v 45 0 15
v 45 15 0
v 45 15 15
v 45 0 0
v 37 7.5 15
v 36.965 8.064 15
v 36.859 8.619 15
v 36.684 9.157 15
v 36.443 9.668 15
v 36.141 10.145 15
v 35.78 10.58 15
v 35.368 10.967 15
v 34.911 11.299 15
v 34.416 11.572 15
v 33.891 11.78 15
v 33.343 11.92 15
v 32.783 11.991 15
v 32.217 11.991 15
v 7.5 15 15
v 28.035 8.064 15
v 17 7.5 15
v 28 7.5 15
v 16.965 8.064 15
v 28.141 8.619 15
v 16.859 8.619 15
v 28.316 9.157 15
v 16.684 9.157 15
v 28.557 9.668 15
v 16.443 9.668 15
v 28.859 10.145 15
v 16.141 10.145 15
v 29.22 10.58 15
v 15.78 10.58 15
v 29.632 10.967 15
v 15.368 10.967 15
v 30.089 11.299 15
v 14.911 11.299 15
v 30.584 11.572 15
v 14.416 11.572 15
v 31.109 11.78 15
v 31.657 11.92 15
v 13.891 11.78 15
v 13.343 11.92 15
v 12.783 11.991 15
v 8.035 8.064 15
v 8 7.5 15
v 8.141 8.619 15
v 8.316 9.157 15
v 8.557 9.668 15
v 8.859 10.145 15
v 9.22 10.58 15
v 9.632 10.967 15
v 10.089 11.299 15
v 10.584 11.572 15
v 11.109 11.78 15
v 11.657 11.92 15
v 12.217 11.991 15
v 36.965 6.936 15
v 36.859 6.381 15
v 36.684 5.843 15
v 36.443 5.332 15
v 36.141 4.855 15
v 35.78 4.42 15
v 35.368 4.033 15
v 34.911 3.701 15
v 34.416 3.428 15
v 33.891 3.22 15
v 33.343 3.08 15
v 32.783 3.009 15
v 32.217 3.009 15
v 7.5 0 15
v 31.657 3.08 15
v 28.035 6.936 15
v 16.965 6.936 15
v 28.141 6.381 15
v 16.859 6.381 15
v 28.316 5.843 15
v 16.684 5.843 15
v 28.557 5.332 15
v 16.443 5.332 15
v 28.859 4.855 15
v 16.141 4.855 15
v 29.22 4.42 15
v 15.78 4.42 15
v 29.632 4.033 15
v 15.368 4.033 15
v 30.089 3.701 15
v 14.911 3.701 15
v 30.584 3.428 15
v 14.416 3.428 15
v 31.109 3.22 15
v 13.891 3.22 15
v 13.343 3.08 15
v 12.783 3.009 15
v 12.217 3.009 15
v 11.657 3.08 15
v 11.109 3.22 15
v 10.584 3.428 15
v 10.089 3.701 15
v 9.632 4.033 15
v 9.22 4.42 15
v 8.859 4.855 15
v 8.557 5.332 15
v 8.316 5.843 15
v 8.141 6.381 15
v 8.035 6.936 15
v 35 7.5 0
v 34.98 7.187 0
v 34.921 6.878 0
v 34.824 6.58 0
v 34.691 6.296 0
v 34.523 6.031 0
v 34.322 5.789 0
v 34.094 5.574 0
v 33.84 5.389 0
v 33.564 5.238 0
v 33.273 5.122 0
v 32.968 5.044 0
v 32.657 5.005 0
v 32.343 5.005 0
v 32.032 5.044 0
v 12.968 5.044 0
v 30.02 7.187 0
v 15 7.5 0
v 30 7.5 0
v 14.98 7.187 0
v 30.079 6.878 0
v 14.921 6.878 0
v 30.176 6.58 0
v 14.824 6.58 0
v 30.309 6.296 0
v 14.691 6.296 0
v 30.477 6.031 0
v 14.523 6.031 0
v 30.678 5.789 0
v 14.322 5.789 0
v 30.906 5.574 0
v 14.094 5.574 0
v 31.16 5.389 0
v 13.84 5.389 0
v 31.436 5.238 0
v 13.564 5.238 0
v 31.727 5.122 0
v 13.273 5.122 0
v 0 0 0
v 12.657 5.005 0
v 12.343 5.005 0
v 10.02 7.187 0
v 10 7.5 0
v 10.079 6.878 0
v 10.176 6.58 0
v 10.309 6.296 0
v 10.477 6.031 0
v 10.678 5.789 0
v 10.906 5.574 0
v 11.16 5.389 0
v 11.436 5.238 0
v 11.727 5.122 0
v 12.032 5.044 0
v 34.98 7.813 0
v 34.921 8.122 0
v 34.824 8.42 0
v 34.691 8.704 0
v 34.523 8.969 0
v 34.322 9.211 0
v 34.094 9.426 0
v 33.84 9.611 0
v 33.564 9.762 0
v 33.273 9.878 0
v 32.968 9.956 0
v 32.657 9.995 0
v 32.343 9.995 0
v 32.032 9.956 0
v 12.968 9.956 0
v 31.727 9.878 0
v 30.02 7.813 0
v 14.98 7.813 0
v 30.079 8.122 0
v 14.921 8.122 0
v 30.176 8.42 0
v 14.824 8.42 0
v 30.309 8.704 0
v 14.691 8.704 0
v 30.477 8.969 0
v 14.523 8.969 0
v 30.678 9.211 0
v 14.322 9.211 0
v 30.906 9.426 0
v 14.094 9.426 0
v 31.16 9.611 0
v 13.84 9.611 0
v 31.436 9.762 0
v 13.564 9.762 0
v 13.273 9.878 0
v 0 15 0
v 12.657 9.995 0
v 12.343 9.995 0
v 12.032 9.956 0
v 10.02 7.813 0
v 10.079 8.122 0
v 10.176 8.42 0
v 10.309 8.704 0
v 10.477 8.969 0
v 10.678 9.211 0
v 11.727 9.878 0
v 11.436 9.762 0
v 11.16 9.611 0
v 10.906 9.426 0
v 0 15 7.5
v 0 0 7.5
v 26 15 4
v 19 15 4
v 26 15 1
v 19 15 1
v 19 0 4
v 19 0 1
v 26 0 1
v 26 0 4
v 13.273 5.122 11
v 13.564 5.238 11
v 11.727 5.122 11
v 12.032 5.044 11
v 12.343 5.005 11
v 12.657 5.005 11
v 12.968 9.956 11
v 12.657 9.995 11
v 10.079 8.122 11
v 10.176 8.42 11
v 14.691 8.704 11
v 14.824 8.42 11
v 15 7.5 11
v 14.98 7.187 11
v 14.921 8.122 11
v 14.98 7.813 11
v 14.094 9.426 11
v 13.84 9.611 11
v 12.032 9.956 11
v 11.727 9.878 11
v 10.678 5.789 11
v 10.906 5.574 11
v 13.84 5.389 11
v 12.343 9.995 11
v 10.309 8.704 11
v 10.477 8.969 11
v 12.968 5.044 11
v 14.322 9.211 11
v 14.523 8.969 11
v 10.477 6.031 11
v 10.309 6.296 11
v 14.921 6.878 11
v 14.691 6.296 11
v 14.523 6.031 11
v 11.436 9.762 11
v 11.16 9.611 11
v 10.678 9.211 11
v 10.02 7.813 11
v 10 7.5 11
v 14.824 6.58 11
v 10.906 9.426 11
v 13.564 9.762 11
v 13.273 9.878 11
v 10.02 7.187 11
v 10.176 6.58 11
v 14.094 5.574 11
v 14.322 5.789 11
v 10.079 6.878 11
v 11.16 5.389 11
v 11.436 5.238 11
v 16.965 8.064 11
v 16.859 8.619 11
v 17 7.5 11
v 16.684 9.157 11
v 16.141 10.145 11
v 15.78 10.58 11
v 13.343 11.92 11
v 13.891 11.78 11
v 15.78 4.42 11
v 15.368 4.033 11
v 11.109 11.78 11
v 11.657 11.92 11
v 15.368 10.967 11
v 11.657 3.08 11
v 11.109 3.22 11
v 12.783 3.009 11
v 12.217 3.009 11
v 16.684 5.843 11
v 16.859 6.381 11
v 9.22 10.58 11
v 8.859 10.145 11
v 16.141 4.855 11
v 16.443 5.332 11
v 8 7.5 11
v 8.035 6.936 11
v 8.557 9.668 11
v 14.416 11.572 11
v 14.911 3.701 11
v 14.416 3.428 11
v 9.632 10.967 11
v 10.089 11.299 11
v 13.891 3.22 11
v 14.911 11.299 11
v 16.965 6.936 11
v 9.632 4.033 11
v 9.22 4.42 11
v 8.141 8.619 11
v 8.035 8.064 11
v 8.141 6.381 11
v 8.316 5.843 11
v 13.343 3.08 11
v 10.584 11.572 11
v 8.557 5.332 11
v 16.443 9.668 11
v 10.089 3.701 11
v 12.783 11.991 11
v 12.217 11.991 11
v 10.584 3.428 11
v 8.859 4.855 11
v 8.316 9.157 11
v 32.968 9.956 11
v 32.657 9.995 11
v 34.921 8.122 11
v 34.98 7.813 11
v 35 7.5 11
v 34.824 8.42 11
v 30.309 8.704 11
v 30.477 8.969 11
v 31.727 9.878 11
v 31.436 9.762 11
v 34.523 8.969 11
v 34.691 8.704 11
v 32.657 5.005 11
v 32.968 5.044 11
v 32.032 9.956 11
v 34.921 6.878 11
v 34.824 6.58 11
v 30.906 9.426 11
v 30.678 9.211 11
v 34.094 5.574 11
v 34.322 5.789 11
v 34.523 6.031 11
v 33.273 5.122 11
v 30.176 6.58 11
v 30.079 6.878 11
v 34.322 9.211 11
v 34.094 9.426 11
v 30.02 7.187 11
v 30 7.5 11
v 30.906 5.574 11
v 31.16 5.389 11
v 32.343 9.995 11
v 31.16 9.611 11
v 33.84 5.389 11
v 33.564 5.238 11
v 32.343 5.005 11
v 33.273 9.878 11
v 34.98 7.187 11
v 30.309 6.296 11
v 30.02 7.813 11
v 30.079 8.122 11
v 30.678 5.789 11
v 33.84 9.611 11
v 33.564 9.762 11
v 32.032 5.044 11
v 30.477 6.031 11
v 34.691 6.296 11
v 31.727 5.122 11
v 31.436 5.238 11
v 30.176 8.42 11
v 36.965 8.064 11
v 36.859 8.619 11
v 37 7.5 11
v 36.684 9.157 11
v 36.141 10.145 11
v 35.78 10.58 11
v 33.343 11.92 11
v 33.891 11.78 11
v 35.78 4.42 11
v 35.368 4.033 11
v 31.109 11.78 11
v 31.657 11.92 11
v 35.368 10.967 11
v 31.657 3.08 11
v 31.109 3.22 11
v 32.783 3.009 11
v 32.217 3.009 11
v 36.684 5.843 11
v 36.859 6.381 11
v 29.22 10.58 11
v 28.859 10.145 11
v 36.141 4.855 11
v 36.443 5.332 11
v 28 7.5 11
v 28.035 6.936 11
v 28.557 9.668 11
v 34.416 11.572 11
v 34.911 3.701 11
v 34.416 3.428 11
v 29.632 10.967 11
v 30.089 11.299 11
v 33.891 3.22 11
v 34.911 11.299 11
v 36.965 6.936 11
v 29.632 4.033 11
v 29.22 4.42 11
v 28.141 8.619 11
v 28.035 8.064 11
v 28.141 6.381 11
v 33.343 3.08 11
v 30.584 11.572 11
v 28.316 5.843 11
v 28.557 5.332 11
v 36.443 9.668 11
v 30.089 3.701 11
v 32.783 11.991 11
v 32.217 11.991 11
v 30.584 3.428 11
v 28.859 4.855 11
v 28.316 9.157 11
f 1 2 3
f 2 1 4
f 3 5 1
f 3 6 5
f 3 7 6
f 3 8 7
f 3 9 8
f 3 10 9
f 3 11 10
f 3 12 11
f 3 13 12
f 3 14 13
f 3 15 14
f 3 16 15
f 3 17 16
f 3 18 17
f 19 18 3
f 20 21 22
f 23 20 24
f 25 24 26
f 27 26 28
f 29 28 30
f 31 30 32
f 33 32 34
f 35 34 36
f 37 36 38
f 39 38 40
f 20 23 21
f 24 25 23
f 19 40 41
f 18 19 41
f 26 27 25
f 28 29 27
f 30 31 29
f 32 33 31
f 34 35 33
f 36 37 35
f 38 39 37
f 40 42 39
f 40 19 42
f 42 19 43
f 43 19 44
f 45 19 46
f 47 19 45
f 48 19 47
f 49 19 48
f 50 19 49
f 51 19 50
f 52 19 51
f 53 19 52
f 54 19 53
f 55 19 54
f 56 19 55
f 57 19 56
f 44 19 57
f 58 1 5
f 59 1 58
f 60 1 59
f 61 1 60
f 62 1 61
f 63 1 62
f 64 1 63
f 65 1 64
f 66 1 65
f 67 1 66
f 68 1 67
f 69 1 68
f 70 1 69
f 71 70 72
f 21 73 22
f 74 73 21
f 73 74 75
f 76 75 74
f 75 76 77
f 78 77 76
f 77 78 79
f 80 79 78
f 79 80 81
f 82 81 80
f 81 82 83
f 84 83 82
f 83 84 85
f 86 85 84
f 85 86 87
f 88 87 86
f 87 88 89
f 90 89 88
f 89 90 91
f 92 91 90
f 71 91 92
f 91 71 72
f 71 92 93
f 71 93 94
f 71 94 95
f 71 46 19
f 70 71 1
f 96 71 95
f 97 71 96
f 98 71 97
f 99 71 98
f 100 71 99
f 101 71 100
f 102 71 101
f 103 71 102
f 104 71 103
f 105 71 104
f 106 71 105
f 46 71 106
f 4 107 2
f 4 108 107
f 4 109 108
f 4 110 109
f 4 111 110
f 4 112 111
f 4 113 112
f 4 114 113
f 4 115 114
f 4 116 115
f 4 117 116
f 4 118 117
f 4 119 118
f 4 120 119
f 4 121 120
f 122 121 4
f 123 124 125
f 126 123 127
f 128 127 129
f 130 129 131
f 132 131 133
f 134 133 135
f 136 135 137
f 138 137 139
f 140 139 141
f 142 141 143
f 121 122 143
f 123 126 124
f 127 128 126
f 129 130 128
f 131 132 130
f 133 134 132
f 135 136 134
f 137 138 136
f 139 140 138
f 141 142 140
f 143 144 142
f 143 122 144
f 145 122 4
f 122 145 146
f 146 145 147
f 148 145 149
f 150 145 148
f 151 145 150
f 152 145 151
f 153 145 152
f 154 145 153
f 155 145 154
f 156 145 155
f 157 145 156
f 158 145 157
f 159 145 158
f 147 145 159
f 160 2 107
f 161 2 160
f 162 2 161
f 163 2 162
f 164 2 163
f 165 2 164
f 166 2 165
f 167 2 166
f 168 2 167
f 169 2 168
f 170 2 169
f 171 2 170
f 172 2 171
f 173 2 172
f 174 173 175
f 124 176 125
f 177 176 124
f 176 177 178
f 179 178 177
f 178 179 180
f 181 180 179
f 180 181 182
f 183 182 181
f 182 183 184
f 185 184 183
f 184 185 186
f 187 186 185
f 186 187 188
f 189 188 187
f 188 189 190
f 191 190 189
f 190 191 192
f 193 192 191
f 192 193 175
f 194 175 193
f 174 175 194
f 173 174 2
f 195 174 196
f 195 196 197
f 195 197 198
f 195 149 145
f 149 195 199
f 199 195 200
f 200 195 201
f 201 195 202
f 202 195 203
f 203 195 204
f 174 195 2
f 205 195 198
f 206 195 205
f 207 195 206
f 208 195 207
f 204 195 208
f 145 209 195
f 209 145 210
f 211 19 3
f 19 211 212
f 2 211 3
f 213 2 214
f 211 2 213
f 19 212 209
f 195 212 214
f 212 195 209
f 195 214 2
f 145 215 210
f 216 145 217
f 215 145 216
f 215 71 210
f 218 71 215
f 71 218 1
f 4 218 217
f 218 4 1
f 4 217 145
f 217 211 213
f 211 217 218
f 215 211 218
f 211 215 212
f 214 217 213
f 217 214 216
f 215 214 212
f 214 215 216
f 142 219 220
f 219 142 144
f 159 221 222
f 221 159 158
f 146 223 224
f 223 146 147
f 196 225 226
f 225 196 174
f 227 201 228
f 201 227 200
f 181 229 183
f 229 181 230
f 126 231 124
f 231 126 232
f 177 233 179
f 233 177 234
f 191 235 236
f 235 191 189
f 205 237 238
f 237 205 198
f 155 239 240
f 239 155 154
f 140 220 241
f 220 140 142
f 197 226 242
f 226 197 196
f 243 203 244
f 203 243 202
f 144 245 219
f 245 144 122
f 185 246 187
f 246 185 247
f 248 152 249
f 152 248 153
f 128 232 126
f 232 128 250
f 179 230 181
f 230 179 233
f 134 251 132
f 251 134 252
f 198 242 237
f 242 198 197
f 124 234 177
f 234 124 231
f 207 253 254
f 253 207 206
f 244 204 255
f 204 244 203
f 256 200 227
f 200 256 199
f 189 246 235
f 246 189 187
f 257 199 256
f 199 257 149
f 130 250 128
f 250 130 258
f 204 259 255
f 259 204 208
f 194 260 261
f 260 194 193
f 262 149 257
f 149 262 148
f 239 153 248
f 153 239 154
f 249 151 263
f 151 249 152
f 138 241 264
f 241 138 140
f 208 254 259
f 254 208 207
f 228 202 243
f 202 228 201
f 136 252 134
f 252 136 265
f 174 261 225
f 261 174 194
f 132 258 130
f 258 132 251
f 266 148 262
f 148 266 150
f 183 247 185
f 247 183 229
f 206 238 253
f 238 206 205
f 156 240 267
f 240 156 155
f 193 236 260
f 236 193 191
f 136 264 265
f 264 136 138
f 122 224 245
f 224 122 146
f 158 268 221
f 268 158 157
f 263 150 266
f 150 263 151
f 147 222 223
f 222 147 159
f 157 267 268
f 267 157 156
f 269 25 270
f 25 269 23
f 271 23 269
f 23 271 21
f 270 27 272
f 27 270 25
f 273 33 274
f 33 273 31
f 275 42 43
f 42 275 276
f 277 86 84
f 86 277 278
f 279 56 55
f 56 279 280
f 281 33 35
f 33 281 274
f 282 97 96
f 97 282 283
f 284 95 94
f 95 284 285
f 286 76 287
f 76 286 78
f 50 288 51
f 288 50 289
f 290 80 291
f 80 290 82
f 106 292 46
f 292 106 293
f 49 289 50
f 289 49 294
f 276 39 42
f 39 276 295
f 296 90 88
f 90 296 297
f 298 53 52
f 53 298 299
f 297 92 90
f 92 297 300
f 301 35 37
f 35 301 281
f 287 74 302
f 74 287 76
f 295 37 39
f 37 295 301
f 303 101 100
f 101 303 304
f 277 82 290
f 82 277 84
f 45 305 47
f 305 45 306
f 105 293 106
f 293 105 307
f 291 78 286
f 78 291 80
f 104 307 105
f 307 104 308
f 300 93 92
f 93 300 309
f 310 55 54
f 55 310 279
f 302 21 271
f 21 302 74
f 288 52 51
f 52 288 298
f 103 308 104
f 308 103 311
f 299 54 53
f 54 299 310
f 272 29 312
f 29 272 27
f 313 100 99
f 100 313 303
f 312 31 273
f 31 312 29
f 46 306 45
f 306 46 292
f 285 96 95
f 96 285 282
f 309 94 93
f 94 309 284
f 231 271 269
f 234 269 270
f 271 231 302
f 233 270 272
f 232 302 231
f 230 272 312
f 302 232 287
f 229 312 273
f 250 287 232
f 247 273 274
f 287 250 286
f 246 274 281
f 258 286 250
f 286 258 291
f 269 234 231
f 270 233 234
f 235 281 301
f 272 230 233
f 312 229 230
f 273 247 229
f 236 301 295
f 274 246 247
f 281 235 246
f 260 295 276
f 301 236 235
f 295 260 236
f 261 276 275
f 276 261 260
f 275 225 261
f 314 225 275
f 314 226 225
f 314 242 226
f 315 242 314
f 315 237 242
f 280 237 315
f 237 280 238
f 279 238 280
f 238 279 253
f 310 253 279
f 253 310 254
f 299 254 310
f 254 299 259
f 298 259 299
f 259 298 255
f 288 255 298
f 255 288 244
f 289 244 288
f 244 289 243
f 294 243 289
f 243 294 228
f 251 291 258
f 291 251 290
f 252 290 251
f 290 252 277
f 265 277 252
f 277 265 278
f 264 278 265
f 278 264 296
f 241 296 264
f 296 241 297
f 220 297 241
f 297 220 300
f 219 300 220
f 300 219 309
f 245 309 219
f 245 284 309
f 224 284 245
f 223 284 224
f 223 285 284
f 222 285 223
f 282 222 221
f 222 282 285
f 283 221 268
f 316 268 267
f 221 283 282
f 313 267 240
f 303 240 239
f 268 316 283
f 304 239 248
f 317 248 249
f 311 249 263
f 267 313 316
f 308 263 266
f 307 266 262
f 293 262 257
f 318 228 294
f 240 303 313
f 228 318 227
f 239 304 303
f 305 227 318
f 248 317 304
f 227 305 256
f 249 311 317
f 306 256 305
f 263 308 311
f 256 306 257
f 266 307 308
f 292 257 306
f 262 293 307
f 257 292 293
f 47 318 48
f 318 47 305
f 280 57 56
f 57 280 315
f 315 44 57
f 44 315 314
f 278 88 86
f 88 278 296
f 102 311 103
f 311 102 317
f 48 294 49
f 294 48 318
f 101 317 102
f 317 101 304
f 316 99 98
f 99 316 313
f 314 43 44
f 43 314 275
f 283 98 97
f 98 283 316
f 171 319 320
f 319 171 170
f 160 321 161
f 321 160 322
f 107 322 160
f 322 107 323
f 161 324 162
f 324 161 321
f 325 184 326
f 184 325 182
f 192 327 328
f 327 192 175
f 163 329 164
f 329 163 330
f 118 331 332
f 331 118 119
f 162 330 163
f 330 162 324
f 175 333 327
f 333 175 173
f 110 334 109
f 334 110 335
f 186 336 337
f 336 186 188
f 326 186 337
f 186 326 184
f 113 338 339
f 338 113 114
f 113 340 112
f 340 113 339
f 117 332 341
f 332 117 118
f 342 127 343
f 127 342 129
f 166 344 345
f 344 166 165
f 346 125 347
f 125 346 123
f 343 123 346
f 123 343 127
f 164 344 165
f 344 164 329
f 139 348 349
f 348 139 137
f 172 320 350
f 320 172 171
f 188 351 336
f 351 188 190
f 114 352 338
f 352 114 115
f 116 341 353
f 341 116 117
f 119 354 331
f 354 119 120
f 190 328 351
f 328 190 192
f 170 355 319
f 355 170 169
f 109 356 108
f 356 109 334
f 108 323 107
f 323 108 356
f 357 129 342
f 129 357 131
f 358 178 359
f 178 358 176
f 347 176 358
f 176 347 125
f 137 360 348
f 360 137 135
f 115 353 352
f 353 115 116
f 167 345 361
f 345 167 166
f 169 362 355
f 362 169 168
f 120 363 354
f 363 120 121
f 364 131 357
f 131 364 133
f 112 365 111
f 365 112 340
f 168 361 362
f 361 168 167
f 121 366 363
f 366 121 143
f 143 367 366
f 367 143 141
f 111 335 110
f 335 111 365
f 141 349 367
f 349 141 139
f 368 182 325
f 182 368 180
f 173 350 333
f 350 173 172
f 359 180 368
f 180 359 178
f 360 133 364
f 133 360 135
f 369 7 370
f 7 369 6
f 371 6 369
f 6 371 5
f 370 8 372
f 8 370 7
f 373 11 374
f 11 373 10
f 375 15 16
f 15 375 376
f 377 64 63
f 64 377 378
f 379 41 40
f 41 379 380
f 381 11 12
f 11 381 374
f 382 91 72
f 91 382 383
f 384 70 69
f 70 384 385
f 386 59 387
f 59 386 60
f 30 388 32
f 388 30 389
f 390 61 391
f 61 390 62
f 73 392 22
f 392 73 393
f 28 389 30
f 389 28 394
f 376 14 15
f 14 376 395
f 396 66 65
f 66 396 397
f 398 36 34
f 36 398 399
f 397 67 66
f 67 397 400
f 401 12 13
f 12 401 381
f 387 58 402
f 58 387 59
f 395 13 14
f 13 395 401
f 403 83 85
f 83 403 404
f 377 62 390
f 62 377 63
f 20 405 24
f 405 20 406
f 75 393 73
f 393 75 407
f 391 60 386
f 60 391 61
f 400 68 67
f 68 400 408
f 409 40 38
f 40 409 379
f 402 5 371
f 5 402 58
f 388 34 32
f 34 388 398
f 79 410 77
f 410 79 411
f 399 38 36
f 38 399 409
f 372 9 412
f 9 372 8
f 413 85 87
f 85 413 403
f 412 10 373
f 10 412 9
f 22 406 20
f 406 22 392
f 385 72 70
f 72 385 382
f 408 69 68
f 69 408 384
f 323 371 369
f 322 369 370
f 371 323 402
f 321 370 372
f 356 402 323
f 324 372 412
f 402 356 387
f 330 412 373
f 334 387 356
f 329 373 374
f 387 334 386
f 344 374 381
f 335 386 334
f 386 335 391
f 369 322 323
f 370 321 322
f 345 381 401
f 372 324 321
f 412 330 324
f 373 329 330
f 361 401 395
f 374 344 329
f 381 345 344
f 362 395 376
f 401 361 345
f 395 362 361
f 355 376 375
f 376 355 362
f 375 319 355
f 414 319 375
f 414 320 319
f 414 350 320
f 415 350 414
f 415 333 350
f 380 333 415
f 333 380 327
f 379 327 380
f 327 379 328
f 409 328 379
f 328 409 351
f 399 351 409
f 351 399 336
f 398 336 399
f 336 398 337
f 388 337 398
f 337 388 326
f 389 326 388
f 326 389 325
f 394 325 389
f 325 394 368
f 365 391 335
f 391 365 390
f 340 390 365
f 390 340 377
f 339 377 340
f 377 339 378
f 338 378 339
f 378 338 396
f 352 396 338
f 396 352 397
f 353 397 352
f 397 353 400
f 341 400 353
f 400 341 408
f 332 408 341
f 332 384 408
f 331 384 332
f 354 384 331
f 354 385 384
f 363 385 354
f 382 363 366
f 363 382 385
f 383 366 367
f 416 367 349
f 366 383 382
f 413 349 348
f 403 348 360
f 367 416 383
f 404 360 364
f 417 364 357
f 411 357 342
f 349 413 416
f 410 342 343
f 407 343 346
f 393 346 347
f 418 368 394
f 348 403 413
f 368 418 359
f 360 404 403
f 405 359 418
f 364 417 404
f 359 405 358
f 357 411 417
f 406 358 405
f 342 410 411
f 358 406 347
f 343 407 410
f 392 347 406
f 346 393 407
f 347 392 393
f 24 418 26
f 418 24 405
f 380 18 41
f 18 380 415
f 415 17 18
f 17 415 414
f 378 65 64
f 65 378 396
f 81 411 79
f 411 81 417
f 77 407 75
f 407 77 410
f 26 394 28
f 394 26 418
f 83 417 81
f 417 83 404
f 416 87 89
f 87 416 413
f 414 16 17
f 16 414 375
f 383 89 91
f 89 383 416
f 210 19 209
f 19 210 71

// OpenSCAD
w = 45;
l = 15;
h = 15;
strap_h = 3;
strap_w = 7;
strap_inset = 1;

head_d = 9;
body_d = 5;
hole_dist = 20;
hole_inset = 4;

difference(){
    cube( [ w, l, h ] );
    
    translate( [ w / 2 - strap_w / 2, -1, strap_inset ] )
        cube( [ strap_w, l + 2, strap_h ] );    
    
    translate( [ w / 2 - hole_dist / 2, l / 2, -1 ] )
        cylinder( d = body_d, h = h + 2, $fn = 50 );
    translate( [ w / 2 - hole_dist / 2, l / 2, h - hole_inset ] )
        cylinder( d = head_d, h = h + 2, $fn = 50 );

    translate( [ w / 2 + hole_dist / 2, l / 2, -1 ] )
        cylinder( d = body_d, h = h + 2, $fn = 50 );
    translate( [ w / 2 + hole_dist / 2, l / 2, h - hole_inset ] )
        cylinder( d = head_d, h = h + 2, $fn = 50 );
    
    translate( [ 0, 0, h / 2 ] )
        rotate( 45, [ 0, 1, 0 ] )
            translate( [ -100, -1, 0 ] )
                cube( [ 100, 100, 100 ] );
}
